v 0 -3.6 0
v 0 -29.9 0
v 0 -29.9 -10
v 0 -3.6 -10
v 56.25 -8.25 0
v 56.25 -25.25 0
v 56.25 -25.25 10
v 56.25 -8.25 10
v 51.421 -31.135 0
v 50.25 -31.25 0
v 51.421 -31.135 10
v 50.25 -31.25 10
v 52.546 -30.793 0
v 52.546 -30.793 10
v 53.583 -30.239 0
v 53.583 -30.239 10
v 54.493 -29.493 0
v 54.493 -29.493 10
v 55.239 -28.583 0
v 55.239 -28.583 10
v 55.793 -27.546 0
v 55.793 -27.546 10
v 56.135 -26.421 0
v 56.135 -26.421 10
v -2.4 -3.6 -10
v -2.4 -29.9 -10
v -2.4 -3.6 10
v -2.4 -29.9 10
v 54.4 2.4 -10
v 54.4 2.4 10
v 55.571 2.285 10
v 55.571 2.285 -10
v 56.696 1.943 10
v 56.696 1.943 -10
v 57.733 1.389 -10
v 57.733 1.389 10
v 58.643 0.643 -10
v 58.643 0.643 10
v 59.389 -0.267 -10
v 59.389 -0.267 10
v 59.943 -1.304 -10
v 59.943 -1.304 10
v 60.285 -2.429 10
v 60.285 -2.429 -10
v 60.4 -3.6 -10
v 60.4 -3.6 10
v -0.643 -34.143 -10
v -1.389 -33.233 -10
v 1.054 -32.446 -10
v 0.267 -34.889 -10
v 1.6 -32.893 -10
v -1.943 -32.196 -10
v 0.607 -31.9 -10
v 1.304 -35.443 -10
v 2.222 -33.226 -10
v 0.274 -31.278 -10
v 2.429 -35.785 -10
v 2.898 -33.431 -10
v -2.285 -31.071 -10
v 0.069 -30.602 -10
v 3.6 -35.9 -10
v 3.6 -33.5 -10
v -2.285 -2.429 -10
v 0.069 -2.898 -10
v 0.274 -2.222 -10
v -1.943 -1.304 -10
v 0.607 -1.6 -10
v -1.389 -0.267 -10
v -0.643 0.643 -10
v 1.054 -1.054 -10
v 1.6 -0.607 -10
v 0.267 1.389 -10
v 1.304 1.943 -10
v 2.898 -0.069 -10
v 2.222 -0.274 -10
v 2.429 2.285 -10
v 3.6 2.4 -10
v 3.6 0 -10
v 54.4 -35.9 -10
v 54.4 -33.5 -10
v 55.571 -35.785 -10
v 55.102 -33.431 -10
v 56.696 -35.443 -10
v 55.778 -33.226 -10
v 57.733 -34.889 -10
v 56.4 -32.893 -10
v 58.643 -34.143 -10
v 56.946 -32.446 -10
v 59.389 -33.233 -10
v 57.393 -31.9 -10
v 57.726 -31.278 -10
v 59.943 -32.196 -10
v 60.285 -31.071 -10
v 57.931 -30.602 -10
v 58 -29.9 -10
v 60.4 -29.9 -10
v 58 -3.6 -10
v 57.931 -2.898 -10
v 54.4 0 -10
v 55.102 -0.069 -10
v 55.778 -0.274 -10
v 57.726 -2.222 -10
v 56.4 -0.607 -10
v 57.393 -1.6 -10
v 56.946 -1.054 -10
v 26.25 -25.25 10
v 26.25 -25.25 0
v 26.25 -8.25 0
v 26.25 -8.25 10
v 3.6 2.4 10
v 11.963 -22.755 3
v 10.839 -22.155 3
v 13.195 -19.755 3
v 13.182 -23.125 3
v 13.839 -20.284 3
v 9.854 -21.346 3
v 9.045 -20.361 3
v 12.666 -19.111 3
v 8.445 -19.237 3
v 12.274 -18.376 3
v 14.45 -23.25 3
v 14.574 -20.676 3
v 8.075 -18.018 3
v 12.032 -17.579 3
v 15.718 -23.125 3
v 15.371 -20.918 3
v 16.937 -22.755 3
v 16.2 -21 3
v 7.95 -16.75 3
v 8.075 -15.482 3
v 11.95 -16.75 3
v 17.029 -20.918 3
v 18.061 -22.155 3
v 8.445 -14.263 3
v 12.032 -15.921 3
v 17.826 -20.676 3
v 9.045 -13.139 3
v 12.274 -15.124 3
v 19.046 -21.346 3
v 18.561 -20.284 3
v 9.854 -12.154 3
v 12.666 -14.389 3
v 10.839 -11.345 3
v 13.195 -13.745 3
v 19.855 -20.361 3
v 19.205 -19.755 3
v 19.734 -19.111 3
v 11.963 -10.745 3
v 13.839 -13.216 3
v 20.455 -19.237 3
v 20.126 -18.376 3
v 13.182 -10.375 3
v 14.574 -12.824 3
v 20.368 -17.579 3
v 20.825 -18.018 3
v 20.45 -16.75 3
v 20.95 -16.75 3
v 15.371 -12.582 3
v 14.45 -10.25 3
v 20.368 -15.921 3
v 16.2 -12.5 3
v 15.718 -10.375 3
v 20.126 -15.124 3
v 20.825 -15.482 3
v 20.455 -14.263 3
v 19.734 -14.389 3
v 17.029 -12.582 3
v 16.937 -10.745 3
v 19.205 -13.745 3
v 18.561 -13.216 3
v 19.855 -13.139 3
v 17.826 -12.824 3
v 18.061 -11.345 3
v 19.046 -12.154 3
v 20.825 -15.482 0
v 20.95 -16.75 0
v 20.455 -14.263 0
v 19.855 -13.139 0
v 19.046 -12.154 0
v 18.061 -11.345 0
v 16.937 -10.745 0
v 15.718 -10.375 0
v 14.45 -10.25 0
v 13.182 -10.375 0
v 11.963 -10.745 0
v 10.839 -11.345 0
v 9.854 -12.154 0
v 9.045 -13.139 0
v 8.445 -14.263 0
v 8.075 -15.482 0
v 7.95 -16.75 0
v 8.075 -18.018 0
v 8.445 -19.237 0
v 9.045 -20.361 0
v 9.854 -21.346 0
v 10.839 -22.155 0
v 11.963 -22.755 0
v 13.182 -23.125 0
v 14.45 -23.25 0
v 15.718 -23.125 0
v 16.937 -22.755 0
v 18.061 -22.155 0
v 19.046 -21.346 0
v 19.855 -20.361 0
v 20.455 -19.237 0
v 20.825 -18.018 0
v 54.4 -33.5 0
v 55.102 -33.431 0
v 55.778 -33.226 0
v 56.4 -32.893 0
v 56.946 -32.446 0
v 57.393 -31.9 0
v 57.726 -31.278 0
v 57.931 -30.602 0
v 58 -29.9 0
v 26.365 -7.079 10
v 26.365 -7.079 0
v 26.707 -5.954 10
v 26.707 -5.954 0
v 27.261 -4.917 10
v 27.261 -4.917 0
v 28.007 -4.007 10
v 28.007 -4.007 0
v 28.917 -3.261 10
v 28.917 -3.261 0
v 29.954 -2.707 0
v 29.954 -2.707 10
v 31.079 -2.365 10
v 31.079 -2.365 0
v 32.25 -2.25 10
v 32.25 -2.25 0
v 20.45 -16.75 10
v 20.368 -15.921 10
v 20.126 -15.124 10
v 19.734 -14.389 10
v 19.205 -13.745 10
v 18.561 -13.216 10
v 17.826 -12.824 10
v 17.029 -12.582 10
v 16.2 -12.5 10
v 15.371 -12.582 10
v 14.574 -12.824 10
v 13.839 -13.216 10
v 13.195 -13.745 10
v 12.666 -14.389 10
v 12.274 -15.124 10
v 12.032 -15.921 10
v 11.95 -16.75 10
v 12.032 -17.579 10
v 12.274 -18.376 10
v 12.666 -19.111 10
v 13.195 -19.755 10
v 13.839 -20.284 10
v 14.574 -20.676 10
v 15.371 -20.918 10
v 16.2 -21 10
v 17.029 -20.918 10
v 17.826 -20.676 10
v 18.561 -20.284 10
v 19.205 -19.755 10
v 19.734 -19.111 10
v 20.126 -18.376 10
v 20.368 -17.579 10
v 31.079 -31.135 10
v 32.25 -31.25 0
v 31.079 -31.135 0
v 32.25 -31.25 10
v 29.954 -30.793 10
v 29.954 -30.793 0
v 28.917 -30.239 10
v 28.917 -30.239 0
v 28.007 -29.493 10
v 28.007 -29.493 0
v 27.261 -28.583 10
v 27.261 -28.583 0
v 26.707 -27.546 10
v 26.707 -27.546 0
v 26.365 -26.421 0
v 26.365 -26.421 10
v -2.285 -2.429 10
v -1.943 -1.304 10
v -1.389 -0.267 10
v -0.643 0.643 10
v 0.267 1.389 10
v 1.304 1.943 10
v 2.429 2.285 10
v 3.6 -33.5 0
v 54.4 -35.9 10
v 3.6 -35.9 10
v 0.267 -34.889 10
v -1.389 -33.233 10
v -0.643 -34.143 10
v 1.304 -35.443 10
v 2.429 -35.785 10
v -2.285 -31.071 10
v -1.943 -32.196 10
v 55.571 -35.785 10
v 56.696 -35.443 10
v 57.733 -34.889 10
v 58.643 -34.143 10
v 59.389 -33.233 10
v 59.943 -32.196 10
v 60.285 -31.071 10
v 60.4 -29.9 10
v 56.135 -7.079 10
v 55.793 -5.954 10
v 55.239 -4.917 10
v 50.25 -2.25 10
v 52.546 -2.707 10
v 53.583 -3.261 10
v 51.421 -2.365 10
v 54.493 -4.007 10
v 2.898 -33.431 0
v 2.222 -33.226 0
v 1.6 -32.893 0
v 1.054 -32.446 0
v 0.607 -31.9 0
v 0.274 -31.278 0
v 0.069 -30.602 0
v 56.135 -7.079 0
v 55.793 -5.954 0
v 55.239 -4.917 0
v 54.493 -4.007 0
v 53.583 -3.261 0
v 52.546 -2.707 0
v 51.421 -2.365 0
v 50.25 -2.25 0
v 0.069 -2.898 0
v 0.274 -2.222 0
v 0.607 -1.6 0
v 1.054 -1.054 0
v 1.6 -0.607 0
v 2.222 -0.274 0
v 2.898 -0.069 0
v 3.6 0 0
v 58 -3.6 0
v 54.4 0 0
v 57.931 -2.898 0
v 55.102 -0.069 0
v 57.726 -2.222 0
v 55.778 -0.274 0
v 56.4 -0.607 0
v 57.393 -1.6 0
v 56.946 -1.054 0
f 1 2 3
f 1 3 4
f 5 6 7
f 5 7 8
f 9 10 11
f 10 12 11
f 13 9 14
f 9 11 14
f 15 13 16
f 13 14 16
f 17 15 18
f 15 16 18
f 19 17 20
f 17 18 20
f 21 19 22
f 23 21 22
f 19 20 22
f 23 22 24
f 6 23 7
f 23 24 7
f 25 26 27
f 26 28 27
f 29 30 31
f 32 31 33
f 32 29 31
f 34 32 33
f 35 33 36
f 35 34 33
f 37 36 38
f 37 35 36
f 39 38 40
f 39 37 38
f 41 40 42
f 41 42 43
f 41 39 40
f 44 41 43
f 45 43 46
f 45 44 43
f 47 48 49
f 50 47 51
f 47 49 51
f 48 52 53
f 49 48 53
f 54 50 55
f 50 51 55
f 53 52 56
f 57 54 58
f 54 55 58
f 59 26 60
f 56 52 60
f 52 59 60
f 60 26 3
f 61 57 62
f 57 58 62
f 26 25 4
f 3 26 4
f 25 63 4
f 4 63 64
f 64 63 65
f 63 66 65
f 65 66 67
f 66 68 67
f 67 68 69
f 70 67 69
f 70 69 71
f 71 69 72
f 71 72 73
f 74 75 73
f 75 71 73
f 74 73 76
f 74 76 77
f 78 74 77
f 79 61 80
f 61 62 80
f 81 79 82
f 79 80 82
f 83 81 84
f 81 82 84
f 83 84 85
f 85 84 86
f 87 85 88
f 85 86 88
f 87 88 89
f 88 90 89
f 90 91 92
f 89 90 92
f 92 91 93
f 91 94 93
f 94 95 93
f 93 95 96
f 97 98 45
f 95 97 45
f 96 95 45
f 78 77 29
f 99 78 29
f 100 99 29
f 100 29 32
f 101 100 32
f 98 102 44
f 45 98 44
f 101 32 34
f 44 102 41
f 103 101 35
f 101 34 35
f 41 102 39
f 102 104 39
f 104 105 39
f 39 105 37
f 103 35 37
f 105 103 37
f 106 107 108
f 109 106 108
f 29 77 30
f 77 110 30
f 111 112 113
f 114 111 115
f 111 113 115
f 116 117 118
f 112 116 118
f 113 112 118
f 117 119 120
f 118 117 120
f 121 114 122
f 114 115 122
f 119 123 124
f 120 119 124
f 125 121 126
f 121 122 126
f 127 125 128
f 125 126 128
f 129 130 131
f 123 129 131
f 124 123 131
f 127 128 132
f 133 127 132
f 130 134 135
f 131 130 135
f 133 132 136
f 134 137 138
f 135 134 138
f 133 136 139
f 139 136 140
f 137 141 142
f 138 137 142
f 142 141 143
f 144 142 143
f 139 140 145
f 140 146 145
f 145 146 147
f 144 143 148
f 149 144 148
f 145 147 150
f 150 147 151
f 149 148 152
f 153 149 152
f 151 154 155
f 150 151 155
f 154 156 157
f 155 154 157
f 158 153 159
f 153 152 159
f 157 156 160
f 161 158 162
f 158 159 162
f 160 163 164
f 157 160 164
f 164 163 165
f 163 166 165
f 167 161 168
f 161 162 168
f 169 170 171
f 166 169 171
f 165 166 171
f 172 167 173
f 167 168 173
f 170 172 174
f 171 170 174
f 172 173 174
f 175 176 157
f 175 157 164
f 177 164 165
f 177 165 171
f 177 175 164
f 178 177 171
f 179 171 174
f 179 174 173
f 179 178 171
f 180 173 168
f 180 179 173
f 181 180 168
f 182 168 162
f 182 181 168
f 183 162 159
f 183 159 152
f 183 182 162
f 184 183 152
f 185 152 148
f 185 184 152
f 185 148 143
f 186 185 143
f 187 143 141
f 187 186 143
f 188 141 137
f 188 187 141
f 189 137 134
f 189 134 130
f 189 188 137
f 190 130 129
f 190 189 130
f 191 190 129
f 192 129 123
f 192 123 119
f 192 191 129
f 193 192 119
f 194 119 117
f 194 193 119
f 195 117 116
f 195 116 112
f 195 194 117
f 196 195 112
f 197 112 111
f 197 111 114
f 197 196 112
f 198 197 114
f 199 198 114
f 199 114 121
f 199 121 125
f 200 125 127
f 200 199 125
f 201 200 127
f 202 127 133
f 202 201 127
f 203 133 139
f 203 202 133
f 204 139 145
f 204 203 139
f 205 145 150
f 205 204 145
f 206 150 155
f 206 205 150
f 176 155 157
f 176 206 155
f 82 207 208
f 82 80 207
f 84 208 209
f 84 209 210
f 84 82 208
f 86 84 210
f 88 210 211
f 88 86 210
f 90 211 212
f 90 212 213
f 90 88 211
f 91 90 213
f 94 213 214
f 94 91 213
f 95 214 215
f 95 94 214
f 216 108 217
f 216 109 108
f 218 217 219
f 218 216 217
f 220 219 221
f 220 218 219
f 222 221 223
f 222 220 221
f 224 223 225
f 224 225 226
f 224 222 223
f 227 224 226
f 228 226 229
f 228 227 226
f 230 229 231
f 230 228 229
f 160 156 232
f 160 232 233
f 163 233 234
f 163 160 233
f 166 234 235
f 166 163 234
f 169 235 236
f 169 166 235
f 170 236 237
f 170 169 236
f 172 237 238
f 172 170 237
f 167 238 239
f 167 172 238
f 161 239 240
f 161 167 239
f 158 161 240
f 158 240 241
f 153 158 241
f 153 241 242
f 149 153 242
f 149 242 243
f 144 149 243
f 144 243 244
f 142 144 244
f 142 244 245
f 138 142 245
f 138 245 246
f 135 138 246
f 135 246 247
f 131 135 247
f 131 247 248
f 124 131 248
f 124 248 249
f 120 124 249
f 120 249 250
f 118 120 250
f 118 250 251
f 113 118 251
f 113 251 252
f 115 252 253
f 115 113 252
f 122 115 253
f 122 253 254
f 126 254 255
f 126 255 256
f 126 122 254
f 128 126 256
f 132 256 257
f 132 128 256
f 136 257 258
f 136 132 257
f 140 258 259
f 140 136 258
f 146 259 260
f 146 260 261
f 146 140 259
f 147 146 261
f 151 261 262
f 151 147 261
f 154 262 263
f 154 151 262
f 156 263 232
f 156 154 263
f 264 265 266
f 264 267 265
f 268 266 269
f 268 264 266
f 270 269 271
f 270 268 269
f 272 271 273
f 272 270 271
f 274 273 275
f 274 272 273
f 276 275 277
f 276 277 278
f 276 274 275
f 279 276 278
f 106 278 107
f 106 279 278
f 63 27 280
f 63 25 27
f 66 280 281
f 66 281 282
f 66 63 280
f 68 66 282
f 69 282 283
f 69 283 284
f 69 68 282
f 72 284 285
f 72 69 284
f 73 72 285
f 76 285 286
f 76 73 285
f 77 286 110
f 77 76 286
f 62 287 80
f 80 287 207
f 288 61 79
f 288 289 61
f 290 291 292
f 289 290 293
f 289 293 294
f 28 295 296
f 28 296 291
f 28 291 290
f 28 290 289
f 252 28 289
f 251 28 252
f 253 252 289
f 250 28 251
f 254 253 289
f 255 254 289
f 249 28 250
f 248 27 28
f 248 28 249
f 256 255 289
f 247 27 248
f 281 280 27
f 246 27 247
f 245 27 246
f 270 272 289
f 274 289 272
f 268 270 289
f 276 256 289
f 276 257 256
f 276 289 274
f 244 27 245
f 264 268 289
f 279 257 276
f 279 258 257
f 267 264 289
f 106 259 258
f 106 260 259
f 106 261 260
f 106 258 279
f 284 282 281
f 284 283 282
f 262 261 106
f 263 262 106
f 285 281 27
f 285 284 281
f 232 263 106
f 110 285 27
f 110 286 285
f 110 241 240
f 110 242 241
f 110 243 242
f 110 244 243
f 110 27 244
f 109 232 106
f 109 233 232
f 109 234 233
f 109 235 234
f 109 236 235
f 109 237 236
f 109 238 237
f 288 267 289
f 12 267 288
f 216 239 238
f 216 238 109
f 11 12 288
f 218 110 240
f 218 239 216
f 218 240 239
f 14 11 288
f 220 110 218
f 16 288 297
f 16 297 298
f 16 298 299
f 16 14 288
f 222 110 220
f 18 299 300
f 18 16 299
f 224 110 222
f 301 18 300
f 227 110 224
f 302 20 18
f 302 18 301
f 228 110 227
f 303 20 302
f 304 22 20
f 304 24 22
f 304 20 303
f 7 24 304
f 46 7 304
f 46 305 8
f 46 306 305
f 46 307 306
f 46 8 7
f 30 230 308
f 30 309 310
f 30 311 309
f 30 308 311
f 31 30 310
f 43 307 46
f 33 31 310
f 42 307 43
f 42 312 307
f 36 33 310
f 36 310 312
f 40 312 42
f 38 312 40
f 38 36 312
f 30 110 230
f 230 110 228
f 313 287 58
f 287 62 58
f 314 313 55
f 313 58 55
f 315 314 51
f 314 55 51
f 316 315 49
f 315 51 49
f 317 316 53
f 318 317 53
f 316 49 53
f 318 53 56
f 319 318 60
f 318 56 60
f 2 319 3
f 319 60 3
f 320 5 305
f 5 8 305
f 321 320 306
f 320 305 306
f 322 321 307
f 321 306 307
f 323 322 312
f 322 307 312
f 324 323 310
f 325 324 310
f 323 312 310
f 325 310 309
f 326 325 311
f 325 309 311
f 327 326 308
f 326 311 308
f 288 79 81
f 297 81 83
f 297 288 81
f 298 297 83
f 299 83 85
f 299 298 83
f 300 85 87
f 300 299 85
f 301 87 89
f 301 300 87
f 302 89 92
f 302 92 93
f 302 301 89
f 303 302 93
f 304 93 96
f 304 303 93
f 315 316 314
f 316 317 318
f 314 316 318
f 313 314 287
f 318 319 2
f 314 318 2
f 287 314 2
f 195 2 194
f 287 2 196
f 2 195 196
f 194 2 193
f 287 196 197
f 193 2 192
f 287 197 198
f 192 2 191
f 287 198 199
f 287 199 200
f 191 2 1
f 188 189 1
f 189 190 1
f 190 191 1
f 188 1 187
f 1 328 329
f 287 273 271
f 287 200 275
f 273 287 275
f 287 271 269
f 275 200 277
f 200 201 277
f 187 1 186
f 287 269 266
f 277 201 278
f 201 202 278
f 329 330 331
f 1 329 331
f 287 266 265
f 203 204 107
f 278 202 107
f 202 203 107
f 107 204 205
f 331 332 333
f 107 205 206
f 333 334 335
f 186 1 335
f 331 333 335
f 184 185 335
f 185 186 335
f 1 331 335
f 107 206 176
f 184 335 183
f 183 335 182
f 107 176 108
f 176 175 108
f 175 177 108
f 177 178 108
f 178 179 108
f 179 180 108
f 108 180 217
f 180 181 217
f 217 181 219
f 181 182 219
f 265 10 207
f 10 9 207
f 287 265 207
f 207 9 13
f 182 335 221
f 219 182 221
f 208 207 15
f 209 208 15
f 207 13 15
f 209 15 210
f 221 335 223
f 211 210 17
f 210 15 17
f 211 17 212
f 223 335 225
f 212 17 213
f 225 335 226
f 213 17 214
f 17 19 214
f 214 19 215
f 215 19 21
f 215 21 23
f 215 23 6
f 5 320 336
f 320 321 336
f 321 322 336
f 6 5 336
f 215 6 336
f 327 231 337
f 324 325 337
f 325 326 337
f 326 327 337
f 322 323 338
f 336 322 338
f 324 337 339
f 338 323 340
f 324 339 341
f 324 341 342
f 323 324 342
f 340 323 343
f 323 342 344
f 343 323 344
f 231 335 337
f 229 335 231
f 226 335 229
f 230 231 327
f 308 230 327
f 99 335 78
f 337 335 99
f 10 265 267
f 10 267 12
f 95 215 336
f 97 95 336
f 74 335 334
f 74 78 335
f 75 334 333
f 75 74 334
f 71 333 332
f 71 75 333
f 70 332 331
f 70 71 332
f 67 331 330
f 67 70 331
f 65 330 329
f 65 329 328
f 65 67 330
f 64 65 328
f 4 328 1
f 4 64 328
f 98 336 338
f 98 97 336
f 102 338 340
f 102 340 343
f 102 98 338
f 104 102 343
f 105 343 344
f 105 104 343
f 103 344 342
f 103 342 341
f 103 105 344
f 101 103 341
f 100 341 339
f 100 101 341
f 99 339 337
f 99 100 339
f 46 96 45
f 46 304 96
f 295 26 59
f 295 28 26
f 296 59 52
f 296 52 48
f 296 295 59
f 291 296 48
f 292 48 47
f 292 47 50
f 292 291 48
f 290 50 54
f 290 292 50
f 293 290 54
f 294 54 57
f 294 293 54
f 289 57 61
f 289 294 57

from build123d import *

# Parameters (mm, degrees)
SKETCH2_W           = 62.8
SKETCH2_H           = 38.3
SKETCH2_R           = 4.25
SKETCH2_W_2         = 30
SKETCH2_H_2         = 29
BOSS_EXTRUDE1_DEPTH = 10
SKETCH2_3_W         = 62.8
SKETCH2_3_H         = 38.3
SKETCH2_3_W_2       = 58
SKETCH2_3_H_2       = 33.5
BOSS_EXTRUDE2_DEPTH = 10
SKETCH2_4_R         = 6.5
CUT_EXTRUDE1_DEPTH  = 3
FILLET1_R           = 3.6
FILLET2_R           = 6


with BuildPart() as part:
    # Sketch2 → Boss-Extrude1 (new body)
    with BuildSketch(Plane.XY):
        with Locations((29, -16.75)):
            Rectangle(SKETCH2_W, SKETCH2_H)
        with Locations((16.2, -16.75)):
            Circle(SKETCH2_R, mode=Mode.SUBTRACT)
        with Locations((41.25, -16.75)):
            Rectangle(SKETCH2_W_2, SKETCH2_H_2, mode=Mode.SUBTRACT)
    extrude(amount=BOSS_EXTRUDE1_DEPTH)

    # Sketch2<3> → Boss-Extrude2 (add)
    with BuildSketch(Plane.XY):
        with Locations((29, -16.75)):
            Rectangle(SKETCH2_3_W, SKETCH2_3_H)
        with Locations((29, -16.75)):
            Rectangle(SKETCH2_3_W_2, SKETCH2_3_H_2, mode=Mode.SUBTRACT)
    extrude(amount=-BOSS_EXTRUDE2_DEPTH)

    # Sketch2<4> → Cut-Extrude1 (cut)
    with BuildSketch(Plane.XY):
        with Locations((14.45, -16.75)):
            Circle(SKETCH2_4_R)
    extrude(amount=CUT_EXTRUDE1_DEPTH, mode=Mode.SUBTRACT)

    # Fillet1
    fillet1_edges = [part.edges().sort_by_distance(p)[0] for p in [
        (58, 0, -5),
        (0, 0, -5),
        (0, -33.5, -5),
        (58, -33.5, -5),
    ]]
    fillet(fillet1_edges, radius=FILLET1_R)

    # Fillet2
    fillet2_edges = [part.edges().sort_by_distance(p)[0] for p in [
        (26.25, -2.25, 5),
        (26.25, -31.25, 5),
        (56.25, -31.25, 5),
        (56.25, -2.25, 5),
        (60.4, -35.9, 0),
        (-2.4, -35.9, 0),
        (-2.4, 2.4, 0),
        (60.4, 2.4, 0),
    ]]
    fillet(fillet2_edges, radius=FILLET2_R)


solid = part.part
